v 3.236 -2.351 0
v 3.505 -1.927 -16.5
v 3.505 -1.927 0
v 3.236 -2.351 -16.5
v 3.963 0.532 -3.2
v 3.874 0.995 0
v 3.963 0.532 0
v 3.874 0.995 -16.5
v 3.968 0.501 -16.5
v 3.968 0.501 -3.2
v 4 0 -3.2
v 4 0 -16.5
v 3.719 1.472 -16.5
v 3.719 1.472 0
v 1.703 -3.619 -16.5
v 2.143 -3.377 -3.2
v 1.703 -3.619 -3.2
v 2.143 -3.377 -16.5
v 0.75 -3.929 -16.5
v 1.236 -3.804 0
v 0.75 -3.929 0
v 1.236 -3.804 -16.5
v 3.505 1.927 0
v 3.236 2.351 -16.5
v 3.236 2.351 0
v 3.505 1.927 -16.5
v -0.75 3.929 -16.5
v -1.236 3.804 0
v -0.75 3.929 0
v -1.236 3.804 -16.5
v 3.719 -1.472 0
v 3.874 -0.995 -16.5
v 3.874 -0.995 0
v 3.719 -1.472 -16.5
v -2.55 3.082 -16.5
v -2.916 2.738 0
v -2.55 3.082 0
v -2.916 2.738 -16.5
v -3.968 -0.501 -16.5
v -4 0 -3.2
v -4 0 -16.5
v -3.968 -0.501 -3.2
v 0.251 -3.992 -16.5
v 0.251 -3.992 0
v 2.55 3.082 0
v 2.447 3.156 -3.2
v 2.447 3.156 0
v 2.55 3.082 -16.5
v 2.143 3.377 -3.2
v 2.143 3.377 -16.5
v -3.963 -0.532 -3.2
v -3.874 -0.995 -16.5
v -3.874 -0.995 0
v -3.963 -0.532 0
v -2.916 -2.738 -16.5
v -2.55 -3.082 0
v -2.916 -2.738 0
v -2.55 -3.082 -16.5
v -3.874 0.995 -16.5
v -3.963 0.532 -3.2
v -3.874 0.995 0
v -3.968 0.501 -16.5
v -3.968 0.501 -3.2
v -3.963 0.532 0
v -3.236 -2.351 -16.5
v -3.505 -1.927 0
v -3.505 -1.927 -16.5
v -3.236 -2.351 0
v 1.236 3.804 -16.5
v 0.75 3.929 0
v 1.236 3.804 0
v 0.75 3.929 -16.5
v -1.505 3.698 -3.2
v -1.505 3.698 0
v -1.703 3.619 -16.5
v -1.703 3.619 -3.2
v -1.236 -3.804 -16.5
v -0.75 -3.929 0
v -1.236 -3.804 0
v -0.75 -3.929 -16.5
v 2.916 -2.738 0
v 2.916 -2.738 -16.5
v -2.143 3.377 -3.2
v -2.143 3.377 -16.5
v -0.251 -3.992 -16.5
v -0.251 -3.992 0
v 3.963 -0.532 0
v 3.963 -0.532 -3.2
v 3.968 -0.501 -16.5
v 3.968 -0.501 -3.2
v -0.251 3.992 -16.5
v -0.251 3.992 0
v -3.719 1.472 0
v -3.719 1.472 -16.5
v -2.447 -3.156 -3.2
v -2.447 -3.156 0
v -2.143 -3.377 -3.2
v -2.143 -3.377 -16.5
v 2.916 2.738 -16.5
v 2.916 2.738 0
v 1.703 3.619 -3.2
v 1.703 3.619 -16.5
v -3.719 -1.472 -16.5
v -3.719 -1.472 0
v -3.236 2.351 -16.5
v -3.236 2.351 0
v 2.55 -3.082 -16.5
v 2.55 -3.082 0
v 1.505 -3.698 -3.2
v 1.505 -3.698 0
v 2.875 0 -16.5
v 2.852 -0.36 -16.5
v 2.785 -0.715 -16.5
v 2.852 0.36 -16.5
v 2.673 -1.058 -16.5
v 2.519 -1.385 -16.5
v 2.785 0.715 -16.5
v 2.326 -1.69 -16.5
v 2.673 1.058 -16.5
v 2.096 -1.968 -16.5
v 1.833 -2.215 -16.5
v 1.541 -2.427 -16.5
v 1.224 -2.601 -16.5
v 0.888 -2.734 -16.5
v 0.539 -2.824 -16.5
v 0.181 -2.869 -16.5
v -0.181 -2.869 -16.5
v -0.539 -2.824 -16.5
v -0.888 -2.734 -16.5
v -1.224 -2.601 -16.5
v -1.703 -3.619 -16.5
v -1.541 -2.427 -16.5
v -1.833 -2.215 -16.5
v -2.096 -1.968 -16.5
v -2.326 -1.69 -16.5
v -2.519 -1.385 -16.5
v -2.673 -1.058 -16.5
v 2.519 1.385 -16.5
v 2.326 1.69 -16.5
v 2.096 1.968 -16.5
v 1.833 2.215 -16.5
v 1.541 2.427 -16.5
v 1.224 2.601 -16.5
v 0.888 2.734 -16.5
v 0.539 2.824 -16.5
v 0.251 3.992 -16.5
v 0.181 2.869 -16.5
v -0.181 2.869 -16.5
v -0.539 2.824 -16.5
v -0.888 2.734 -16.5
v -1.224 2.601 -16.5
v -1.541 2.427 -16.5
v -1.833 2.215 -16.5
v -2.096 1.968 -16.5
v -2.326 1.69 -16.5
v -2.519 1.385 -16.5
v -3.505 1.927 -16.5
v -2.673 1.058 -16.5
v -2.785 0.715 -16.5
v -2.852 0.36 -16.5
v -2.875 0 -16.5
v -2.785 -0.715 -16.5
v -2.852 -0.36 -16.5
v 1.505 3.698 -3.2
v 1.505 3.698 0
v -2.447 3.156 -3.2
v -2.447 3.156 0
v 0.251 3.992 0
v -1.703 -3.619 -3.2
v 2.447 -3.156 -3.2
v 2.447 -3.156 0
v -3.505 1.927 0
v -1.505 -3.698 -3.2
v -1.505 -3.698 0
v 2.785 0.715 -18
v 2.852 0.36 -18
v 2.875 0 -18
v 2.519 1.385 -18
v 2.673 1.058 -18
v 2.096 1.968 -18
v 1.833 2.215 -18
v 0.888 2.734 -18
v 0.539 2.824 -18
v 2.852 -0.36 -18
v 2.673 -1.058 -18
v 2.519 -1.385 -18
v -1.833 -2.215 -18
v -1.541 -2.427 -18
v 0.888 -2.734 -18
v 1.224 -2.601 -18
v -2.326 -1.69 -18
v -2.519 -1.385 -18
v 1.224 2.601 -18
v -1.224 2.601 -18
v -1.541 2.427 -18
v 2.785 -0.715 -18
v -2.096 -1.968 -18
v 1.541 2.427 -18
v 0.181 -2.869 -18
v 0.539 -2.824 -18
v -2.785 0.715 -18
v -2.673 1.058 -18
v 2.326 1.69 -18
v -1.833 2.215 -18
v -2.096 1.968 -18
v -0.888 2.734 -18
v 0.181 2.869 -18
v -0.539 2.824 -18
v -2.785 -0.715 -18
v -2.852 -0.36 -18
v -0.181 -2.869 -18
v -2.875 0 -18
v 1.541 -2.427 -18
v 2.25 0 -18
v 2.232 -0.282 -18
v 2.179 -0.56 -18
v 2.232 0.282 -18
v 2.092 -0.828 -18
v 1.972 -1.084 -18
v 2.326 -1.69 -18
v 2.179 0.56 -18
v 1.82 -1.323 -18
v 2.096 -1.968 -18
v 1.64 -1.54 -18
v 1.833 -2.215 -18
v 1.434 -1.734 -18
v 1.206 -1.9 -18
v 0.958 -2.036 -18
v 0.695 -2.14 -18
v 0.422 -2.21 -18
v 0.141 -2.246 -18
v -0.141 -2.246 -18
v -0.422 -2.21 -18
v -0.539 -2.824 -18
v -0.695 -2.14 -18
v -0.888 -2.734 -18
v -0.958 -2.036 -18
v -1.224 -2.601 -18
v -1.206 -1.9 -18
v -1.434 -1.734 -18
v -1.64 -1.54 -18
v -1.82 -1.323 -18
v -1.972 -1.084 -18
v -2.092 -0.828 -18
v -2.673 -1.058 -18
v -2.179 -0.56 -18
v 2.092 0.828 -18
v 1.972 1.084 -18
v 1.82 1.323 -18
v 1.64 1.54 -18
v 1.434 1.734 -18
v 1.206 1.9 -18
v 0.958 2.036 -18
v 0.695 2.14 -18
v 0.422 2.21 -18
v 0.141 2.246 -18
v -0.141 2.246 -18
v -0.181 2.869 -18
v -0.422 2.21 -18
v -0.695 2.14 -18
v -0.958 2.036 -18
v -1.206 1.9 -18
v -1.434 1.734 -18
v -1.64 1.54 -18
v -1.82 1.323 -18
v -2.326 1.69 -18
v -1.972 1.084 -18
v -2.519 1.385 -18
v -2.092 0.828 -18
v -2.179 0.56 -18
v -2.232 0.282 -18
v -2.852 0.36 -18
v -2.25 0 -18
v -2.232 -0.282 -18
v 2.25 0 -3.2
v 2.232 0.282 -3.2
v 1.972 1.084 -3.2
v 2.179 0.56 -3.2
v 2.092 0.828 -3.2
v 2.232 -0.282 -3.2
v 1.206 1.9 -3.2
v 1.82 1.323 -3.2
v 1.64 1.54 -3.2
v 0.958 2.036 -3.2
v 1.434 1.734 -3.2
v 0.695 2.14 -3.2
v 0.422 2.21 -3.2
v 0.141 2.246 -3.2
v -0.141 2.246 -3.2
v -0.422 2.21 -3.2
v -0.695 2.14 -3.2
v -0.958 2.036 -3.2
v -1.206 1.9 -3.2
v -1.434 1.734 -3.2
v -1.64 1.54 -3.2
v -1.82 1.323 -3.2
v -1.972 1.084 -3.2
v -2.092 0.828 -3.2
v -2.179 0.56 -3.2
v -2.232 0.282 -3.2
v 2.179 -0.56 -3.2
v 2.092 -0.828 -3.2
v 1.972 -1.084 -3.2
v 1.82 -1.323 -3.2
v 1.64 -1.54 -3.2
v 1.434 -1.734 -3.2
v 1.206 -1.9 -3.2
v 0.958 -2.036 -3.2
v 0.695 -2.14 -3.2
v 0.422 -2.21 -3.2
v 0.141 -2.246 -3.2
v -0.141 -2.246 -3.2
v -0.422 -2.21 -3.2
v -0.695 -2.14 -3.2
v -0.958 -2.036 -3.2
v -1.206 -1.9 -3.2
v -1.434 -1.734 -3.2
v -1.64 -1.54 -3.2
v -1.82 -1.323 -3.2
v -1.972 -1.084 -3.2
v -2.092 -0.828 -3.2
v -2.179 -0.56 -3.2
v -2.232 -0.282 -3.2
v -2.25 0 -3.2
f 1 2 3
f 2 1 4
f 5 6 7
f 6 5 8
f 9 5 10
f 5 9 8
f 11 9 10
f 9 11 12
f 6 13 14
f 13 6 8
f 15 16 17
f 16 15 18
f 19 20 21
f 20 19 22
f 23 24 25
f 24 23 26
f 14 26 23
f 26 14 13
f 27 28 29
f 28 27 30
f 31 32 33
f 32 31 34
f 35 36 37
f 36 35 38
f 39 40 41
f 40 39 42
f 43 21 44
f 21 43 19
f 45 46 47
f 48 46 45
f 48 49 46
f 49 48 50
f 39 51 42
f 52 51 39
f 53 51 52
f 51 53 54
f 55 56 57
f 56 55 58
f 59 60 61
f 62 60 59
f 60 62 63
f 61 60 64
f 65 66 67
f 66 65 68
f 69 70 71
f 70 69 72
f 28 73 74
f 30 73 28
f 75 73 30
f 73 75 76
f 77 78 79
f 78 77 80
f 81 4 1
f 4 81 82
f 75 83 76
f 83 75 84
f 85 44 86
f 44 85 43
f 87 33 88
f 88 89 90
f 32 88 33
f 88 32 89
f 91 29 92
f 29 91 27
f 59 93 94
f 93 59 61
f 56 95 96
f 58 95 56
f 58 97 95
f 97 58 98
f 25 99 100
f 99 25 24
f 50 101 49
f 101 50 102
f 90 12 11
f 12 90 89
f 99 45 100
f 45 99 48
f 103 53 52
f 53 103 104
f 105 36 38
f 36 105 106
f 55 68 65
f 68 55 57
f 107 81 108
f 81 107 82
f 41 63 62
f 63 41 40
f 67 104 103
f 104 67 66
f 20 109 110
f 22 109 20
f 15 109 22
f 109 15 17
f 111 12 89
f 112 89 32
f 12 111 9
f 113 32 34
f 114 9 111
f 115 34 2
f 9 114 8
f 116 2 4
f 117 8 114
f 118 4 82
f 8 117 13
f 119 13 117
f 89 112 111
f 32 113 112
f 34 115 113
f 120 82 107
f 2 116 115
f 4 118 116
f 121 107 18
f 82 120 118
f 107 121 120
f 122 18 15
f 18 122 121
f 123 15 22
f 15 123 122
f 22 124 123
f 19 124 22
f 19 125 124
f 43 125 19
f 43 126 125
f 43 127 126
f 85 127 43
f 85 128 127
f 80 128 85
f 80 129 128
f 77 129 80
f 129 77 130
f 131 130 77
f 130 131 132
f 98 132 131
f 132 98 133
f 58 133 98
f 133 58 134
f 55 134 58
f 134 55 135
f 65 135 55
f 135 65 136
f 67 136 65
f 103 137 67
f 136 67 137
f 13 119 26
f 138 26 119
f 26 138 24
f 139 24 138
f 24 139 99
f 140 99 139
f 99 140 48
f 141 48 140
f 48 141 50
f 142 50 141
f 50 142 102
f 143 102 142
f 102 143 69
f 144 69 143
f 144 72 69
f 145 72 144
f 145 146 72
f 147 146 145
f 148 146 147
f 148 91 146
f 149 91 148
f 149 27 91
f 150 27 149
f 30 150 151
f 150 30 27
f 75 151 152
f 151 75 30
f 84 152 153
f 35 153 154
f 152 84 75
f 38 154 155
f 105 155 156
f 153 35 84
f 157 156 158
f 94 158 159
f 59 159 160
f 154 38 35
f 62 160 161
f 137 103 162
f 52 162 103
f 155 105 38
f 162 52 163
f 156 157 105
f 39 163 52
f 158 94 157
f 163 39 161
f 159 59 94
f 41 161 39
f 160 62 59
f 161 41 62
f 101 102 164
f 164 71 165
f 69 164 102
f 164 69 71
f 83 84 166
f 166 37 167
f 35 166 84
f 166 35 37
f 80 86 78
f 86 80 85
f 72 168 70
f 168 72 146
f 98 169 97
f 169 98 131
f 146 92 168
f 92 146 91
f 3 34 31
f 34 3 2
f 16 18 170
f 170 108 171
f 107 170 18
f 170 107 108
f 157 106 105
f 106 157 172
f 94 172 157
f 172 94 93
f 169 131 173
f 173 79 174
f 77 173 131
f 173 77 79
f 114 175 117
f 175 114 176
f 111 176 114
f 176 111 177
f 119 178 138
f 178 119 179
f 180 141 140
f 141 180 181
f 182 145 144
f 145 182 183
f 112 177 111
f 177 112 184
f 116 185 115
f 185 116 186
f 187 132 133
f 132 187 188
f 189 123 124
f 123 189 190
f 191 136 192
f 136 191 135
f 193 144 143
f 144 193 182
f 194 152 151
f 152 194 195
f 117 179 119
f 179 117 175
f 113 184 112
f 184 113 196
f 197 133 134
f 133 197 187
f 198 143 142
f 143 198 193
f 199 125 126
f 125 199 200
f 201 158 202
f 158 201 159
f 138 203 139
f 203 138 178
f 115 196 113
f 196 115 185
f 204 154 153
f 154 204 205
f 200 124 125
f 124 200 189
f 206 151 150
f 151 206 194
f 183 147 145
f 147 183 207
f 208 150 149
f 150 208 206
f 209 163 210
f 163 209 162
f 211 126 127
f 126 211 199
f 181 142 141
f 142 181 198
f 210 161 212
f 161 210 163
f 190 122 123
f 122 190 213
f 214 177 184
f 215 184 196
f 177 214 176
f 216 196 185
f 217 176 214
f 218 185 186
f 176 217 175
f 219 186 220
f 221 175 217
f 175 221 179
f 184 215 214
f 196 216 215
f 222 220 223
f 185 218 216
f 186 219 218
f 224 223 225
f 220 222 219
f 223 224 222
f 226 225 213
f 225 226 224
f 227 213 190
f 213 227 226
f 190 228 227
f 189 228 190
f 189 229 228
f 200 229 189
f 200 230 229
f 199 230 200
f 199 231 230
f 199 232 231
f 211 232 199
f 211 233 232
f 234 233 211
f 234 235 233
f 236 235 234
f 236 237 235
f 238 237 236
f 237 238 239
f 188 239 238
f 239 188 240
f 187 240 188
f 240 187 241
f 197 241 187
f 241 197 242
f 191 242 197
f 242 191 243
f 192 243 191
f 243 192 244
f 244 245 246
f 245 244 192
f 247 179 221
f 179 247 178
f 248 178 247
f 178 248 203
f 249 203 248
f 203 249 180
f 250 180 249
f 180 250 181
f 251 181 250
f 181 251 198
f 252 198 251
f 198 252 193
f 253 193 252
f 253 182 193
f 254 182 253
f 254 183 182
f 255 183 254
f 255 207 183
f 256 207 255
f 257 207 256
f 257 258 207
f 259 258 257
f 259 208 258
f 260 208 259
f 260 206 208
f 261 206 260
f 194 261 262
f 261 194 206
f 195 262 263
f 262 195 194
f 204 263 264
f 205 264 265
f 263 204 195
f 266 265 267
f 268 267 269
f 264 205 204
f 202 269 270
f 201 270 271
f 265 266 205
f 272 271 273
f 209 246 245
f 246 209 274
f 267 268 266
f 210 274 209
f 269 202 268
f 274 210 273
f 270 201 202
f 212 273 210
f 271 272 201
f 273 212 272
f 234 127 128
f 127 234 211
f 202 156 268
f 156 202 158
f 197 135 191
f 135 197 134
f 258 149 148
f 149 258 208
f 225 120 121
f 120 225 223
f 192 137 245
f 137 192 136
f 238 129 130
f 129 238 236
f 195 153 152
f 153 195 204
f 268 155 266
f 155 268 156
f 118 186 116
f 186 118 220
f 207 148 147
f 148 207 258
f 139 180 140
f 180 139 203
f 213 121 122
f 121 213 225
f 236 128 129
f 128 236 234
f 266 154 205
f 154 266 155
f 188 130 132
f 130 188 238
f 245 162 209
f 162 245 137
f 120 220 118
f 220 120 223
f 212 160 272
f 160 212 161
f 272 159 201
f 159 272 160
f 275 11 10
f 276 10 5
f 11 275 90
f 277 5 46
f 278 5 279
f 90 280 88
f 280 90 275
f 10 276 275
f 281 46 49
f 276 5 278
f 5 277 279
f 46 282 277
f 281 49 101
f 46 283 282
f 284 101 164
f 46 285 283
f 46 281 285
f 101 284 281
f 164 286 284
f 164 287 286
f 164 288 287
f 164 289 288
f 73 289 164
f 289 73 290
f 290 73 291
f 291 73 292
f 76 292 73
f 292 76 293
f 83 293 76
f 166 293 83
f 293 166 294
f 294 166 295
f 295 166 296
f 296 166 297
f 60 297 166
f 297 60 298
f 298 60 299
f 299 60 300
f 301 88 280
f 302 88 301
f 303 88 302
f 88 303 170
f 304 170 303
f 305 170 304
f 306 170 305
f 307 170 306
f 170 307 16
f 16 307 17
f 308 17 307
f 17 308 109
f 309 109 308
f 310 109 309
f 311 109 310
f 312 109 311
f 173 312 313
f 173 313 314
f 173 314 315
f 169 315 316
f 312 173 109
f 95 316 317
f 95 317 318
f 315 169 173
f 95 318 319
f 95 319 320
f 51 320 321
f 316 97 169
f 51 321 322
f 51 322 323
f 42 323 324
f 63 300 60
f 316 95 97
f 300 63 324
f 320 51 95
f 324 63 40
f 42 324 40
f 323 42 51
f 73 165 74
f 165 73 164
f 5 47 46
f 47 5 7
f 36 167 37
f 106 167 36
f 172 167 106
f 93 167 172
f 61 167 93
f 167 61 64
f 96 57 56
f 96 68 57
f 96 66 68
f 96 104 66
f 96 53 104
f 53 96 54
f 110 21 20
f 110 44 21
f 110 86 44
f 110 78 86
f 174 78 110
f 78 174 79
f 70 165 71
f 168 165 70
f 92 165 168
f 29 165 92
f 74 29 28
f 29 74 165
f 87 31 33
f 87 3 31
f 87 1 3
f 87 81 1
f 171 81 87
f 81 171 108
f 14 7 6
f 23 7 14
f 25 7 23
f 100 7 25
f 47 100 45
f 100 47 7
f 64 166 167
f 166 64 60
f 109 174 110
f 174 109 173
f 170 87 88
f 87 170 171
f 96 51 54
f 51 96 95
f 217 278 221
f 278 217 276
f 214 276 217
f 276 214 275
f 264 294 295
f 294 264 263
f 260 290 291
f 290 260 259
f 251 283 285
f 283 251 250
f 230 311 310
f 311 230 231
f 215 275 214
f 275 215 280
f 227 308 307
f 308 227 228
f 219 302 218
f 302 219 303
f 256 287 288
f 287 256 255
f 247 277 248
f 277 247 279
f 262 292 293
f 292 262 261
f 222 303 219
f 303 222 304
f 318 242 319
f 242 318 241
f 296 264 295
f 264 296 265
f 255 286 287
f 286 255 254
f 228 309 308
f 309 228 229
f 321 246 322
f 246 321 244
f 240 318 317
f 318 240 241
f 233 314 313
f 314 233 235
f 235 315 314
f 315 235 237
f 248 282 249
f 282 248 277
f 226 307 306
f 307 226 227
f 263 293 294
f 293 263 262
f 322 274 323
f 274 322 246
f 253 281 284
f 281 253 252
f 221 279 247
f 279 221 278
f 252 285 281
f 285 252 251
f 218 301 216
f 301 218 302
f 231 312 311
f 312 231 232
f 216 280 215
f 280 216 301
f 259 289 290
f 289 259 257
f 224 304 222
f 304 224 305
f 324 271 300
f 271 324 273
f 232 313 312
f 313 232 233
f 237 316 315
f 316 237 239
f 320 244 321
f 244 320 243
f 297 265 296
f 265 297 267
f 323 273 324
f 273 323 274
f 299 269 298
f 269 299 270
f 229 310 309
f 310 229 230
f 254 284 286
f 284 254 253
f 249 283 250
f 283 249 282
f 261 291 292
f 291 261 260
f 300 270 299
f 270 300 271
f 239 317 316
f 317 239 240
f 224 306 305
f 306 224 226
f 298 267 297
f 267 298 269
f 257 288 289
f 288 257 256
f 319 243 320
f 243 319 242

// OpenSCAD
$fn = 50;

difference() {
	union() {
		translate(v = [0, 0, -16.5]) {
			cylinder(h = 19.5, r = 4.0);
		}
		#translate(v = [0, 0, -18.0]) {
			cylinder(h = 18, r = 2.875);
		}
	}
	union() {
		translate(v = [0, 0, 0]) {
			rotate(a = [0, 0, 0]) {
				difference() {
					union() {
						translate(v = [0, 0, -3.2]) {
							linear_extrude(height = 3.2) {
								polygon(points = [[4.2698, 0.0], [2.1349000000000005, 3.697755269078796], [-2.134899999999999, 3.6977552690787965], [-4.2698, 5.228996902999369e-16], [-2.134900000000002, -3.6977552690787956], [2.1348999999999974, -3.697755269078798]]);
							}
						}
					}
					union();
				}
			}
		}
		#cylinder(h = 3, r = 5.0);
		#translate(v = [0, 0, -100.0]) {
			cylinder(h = 200, r = 2.25);
		}
	}
}
